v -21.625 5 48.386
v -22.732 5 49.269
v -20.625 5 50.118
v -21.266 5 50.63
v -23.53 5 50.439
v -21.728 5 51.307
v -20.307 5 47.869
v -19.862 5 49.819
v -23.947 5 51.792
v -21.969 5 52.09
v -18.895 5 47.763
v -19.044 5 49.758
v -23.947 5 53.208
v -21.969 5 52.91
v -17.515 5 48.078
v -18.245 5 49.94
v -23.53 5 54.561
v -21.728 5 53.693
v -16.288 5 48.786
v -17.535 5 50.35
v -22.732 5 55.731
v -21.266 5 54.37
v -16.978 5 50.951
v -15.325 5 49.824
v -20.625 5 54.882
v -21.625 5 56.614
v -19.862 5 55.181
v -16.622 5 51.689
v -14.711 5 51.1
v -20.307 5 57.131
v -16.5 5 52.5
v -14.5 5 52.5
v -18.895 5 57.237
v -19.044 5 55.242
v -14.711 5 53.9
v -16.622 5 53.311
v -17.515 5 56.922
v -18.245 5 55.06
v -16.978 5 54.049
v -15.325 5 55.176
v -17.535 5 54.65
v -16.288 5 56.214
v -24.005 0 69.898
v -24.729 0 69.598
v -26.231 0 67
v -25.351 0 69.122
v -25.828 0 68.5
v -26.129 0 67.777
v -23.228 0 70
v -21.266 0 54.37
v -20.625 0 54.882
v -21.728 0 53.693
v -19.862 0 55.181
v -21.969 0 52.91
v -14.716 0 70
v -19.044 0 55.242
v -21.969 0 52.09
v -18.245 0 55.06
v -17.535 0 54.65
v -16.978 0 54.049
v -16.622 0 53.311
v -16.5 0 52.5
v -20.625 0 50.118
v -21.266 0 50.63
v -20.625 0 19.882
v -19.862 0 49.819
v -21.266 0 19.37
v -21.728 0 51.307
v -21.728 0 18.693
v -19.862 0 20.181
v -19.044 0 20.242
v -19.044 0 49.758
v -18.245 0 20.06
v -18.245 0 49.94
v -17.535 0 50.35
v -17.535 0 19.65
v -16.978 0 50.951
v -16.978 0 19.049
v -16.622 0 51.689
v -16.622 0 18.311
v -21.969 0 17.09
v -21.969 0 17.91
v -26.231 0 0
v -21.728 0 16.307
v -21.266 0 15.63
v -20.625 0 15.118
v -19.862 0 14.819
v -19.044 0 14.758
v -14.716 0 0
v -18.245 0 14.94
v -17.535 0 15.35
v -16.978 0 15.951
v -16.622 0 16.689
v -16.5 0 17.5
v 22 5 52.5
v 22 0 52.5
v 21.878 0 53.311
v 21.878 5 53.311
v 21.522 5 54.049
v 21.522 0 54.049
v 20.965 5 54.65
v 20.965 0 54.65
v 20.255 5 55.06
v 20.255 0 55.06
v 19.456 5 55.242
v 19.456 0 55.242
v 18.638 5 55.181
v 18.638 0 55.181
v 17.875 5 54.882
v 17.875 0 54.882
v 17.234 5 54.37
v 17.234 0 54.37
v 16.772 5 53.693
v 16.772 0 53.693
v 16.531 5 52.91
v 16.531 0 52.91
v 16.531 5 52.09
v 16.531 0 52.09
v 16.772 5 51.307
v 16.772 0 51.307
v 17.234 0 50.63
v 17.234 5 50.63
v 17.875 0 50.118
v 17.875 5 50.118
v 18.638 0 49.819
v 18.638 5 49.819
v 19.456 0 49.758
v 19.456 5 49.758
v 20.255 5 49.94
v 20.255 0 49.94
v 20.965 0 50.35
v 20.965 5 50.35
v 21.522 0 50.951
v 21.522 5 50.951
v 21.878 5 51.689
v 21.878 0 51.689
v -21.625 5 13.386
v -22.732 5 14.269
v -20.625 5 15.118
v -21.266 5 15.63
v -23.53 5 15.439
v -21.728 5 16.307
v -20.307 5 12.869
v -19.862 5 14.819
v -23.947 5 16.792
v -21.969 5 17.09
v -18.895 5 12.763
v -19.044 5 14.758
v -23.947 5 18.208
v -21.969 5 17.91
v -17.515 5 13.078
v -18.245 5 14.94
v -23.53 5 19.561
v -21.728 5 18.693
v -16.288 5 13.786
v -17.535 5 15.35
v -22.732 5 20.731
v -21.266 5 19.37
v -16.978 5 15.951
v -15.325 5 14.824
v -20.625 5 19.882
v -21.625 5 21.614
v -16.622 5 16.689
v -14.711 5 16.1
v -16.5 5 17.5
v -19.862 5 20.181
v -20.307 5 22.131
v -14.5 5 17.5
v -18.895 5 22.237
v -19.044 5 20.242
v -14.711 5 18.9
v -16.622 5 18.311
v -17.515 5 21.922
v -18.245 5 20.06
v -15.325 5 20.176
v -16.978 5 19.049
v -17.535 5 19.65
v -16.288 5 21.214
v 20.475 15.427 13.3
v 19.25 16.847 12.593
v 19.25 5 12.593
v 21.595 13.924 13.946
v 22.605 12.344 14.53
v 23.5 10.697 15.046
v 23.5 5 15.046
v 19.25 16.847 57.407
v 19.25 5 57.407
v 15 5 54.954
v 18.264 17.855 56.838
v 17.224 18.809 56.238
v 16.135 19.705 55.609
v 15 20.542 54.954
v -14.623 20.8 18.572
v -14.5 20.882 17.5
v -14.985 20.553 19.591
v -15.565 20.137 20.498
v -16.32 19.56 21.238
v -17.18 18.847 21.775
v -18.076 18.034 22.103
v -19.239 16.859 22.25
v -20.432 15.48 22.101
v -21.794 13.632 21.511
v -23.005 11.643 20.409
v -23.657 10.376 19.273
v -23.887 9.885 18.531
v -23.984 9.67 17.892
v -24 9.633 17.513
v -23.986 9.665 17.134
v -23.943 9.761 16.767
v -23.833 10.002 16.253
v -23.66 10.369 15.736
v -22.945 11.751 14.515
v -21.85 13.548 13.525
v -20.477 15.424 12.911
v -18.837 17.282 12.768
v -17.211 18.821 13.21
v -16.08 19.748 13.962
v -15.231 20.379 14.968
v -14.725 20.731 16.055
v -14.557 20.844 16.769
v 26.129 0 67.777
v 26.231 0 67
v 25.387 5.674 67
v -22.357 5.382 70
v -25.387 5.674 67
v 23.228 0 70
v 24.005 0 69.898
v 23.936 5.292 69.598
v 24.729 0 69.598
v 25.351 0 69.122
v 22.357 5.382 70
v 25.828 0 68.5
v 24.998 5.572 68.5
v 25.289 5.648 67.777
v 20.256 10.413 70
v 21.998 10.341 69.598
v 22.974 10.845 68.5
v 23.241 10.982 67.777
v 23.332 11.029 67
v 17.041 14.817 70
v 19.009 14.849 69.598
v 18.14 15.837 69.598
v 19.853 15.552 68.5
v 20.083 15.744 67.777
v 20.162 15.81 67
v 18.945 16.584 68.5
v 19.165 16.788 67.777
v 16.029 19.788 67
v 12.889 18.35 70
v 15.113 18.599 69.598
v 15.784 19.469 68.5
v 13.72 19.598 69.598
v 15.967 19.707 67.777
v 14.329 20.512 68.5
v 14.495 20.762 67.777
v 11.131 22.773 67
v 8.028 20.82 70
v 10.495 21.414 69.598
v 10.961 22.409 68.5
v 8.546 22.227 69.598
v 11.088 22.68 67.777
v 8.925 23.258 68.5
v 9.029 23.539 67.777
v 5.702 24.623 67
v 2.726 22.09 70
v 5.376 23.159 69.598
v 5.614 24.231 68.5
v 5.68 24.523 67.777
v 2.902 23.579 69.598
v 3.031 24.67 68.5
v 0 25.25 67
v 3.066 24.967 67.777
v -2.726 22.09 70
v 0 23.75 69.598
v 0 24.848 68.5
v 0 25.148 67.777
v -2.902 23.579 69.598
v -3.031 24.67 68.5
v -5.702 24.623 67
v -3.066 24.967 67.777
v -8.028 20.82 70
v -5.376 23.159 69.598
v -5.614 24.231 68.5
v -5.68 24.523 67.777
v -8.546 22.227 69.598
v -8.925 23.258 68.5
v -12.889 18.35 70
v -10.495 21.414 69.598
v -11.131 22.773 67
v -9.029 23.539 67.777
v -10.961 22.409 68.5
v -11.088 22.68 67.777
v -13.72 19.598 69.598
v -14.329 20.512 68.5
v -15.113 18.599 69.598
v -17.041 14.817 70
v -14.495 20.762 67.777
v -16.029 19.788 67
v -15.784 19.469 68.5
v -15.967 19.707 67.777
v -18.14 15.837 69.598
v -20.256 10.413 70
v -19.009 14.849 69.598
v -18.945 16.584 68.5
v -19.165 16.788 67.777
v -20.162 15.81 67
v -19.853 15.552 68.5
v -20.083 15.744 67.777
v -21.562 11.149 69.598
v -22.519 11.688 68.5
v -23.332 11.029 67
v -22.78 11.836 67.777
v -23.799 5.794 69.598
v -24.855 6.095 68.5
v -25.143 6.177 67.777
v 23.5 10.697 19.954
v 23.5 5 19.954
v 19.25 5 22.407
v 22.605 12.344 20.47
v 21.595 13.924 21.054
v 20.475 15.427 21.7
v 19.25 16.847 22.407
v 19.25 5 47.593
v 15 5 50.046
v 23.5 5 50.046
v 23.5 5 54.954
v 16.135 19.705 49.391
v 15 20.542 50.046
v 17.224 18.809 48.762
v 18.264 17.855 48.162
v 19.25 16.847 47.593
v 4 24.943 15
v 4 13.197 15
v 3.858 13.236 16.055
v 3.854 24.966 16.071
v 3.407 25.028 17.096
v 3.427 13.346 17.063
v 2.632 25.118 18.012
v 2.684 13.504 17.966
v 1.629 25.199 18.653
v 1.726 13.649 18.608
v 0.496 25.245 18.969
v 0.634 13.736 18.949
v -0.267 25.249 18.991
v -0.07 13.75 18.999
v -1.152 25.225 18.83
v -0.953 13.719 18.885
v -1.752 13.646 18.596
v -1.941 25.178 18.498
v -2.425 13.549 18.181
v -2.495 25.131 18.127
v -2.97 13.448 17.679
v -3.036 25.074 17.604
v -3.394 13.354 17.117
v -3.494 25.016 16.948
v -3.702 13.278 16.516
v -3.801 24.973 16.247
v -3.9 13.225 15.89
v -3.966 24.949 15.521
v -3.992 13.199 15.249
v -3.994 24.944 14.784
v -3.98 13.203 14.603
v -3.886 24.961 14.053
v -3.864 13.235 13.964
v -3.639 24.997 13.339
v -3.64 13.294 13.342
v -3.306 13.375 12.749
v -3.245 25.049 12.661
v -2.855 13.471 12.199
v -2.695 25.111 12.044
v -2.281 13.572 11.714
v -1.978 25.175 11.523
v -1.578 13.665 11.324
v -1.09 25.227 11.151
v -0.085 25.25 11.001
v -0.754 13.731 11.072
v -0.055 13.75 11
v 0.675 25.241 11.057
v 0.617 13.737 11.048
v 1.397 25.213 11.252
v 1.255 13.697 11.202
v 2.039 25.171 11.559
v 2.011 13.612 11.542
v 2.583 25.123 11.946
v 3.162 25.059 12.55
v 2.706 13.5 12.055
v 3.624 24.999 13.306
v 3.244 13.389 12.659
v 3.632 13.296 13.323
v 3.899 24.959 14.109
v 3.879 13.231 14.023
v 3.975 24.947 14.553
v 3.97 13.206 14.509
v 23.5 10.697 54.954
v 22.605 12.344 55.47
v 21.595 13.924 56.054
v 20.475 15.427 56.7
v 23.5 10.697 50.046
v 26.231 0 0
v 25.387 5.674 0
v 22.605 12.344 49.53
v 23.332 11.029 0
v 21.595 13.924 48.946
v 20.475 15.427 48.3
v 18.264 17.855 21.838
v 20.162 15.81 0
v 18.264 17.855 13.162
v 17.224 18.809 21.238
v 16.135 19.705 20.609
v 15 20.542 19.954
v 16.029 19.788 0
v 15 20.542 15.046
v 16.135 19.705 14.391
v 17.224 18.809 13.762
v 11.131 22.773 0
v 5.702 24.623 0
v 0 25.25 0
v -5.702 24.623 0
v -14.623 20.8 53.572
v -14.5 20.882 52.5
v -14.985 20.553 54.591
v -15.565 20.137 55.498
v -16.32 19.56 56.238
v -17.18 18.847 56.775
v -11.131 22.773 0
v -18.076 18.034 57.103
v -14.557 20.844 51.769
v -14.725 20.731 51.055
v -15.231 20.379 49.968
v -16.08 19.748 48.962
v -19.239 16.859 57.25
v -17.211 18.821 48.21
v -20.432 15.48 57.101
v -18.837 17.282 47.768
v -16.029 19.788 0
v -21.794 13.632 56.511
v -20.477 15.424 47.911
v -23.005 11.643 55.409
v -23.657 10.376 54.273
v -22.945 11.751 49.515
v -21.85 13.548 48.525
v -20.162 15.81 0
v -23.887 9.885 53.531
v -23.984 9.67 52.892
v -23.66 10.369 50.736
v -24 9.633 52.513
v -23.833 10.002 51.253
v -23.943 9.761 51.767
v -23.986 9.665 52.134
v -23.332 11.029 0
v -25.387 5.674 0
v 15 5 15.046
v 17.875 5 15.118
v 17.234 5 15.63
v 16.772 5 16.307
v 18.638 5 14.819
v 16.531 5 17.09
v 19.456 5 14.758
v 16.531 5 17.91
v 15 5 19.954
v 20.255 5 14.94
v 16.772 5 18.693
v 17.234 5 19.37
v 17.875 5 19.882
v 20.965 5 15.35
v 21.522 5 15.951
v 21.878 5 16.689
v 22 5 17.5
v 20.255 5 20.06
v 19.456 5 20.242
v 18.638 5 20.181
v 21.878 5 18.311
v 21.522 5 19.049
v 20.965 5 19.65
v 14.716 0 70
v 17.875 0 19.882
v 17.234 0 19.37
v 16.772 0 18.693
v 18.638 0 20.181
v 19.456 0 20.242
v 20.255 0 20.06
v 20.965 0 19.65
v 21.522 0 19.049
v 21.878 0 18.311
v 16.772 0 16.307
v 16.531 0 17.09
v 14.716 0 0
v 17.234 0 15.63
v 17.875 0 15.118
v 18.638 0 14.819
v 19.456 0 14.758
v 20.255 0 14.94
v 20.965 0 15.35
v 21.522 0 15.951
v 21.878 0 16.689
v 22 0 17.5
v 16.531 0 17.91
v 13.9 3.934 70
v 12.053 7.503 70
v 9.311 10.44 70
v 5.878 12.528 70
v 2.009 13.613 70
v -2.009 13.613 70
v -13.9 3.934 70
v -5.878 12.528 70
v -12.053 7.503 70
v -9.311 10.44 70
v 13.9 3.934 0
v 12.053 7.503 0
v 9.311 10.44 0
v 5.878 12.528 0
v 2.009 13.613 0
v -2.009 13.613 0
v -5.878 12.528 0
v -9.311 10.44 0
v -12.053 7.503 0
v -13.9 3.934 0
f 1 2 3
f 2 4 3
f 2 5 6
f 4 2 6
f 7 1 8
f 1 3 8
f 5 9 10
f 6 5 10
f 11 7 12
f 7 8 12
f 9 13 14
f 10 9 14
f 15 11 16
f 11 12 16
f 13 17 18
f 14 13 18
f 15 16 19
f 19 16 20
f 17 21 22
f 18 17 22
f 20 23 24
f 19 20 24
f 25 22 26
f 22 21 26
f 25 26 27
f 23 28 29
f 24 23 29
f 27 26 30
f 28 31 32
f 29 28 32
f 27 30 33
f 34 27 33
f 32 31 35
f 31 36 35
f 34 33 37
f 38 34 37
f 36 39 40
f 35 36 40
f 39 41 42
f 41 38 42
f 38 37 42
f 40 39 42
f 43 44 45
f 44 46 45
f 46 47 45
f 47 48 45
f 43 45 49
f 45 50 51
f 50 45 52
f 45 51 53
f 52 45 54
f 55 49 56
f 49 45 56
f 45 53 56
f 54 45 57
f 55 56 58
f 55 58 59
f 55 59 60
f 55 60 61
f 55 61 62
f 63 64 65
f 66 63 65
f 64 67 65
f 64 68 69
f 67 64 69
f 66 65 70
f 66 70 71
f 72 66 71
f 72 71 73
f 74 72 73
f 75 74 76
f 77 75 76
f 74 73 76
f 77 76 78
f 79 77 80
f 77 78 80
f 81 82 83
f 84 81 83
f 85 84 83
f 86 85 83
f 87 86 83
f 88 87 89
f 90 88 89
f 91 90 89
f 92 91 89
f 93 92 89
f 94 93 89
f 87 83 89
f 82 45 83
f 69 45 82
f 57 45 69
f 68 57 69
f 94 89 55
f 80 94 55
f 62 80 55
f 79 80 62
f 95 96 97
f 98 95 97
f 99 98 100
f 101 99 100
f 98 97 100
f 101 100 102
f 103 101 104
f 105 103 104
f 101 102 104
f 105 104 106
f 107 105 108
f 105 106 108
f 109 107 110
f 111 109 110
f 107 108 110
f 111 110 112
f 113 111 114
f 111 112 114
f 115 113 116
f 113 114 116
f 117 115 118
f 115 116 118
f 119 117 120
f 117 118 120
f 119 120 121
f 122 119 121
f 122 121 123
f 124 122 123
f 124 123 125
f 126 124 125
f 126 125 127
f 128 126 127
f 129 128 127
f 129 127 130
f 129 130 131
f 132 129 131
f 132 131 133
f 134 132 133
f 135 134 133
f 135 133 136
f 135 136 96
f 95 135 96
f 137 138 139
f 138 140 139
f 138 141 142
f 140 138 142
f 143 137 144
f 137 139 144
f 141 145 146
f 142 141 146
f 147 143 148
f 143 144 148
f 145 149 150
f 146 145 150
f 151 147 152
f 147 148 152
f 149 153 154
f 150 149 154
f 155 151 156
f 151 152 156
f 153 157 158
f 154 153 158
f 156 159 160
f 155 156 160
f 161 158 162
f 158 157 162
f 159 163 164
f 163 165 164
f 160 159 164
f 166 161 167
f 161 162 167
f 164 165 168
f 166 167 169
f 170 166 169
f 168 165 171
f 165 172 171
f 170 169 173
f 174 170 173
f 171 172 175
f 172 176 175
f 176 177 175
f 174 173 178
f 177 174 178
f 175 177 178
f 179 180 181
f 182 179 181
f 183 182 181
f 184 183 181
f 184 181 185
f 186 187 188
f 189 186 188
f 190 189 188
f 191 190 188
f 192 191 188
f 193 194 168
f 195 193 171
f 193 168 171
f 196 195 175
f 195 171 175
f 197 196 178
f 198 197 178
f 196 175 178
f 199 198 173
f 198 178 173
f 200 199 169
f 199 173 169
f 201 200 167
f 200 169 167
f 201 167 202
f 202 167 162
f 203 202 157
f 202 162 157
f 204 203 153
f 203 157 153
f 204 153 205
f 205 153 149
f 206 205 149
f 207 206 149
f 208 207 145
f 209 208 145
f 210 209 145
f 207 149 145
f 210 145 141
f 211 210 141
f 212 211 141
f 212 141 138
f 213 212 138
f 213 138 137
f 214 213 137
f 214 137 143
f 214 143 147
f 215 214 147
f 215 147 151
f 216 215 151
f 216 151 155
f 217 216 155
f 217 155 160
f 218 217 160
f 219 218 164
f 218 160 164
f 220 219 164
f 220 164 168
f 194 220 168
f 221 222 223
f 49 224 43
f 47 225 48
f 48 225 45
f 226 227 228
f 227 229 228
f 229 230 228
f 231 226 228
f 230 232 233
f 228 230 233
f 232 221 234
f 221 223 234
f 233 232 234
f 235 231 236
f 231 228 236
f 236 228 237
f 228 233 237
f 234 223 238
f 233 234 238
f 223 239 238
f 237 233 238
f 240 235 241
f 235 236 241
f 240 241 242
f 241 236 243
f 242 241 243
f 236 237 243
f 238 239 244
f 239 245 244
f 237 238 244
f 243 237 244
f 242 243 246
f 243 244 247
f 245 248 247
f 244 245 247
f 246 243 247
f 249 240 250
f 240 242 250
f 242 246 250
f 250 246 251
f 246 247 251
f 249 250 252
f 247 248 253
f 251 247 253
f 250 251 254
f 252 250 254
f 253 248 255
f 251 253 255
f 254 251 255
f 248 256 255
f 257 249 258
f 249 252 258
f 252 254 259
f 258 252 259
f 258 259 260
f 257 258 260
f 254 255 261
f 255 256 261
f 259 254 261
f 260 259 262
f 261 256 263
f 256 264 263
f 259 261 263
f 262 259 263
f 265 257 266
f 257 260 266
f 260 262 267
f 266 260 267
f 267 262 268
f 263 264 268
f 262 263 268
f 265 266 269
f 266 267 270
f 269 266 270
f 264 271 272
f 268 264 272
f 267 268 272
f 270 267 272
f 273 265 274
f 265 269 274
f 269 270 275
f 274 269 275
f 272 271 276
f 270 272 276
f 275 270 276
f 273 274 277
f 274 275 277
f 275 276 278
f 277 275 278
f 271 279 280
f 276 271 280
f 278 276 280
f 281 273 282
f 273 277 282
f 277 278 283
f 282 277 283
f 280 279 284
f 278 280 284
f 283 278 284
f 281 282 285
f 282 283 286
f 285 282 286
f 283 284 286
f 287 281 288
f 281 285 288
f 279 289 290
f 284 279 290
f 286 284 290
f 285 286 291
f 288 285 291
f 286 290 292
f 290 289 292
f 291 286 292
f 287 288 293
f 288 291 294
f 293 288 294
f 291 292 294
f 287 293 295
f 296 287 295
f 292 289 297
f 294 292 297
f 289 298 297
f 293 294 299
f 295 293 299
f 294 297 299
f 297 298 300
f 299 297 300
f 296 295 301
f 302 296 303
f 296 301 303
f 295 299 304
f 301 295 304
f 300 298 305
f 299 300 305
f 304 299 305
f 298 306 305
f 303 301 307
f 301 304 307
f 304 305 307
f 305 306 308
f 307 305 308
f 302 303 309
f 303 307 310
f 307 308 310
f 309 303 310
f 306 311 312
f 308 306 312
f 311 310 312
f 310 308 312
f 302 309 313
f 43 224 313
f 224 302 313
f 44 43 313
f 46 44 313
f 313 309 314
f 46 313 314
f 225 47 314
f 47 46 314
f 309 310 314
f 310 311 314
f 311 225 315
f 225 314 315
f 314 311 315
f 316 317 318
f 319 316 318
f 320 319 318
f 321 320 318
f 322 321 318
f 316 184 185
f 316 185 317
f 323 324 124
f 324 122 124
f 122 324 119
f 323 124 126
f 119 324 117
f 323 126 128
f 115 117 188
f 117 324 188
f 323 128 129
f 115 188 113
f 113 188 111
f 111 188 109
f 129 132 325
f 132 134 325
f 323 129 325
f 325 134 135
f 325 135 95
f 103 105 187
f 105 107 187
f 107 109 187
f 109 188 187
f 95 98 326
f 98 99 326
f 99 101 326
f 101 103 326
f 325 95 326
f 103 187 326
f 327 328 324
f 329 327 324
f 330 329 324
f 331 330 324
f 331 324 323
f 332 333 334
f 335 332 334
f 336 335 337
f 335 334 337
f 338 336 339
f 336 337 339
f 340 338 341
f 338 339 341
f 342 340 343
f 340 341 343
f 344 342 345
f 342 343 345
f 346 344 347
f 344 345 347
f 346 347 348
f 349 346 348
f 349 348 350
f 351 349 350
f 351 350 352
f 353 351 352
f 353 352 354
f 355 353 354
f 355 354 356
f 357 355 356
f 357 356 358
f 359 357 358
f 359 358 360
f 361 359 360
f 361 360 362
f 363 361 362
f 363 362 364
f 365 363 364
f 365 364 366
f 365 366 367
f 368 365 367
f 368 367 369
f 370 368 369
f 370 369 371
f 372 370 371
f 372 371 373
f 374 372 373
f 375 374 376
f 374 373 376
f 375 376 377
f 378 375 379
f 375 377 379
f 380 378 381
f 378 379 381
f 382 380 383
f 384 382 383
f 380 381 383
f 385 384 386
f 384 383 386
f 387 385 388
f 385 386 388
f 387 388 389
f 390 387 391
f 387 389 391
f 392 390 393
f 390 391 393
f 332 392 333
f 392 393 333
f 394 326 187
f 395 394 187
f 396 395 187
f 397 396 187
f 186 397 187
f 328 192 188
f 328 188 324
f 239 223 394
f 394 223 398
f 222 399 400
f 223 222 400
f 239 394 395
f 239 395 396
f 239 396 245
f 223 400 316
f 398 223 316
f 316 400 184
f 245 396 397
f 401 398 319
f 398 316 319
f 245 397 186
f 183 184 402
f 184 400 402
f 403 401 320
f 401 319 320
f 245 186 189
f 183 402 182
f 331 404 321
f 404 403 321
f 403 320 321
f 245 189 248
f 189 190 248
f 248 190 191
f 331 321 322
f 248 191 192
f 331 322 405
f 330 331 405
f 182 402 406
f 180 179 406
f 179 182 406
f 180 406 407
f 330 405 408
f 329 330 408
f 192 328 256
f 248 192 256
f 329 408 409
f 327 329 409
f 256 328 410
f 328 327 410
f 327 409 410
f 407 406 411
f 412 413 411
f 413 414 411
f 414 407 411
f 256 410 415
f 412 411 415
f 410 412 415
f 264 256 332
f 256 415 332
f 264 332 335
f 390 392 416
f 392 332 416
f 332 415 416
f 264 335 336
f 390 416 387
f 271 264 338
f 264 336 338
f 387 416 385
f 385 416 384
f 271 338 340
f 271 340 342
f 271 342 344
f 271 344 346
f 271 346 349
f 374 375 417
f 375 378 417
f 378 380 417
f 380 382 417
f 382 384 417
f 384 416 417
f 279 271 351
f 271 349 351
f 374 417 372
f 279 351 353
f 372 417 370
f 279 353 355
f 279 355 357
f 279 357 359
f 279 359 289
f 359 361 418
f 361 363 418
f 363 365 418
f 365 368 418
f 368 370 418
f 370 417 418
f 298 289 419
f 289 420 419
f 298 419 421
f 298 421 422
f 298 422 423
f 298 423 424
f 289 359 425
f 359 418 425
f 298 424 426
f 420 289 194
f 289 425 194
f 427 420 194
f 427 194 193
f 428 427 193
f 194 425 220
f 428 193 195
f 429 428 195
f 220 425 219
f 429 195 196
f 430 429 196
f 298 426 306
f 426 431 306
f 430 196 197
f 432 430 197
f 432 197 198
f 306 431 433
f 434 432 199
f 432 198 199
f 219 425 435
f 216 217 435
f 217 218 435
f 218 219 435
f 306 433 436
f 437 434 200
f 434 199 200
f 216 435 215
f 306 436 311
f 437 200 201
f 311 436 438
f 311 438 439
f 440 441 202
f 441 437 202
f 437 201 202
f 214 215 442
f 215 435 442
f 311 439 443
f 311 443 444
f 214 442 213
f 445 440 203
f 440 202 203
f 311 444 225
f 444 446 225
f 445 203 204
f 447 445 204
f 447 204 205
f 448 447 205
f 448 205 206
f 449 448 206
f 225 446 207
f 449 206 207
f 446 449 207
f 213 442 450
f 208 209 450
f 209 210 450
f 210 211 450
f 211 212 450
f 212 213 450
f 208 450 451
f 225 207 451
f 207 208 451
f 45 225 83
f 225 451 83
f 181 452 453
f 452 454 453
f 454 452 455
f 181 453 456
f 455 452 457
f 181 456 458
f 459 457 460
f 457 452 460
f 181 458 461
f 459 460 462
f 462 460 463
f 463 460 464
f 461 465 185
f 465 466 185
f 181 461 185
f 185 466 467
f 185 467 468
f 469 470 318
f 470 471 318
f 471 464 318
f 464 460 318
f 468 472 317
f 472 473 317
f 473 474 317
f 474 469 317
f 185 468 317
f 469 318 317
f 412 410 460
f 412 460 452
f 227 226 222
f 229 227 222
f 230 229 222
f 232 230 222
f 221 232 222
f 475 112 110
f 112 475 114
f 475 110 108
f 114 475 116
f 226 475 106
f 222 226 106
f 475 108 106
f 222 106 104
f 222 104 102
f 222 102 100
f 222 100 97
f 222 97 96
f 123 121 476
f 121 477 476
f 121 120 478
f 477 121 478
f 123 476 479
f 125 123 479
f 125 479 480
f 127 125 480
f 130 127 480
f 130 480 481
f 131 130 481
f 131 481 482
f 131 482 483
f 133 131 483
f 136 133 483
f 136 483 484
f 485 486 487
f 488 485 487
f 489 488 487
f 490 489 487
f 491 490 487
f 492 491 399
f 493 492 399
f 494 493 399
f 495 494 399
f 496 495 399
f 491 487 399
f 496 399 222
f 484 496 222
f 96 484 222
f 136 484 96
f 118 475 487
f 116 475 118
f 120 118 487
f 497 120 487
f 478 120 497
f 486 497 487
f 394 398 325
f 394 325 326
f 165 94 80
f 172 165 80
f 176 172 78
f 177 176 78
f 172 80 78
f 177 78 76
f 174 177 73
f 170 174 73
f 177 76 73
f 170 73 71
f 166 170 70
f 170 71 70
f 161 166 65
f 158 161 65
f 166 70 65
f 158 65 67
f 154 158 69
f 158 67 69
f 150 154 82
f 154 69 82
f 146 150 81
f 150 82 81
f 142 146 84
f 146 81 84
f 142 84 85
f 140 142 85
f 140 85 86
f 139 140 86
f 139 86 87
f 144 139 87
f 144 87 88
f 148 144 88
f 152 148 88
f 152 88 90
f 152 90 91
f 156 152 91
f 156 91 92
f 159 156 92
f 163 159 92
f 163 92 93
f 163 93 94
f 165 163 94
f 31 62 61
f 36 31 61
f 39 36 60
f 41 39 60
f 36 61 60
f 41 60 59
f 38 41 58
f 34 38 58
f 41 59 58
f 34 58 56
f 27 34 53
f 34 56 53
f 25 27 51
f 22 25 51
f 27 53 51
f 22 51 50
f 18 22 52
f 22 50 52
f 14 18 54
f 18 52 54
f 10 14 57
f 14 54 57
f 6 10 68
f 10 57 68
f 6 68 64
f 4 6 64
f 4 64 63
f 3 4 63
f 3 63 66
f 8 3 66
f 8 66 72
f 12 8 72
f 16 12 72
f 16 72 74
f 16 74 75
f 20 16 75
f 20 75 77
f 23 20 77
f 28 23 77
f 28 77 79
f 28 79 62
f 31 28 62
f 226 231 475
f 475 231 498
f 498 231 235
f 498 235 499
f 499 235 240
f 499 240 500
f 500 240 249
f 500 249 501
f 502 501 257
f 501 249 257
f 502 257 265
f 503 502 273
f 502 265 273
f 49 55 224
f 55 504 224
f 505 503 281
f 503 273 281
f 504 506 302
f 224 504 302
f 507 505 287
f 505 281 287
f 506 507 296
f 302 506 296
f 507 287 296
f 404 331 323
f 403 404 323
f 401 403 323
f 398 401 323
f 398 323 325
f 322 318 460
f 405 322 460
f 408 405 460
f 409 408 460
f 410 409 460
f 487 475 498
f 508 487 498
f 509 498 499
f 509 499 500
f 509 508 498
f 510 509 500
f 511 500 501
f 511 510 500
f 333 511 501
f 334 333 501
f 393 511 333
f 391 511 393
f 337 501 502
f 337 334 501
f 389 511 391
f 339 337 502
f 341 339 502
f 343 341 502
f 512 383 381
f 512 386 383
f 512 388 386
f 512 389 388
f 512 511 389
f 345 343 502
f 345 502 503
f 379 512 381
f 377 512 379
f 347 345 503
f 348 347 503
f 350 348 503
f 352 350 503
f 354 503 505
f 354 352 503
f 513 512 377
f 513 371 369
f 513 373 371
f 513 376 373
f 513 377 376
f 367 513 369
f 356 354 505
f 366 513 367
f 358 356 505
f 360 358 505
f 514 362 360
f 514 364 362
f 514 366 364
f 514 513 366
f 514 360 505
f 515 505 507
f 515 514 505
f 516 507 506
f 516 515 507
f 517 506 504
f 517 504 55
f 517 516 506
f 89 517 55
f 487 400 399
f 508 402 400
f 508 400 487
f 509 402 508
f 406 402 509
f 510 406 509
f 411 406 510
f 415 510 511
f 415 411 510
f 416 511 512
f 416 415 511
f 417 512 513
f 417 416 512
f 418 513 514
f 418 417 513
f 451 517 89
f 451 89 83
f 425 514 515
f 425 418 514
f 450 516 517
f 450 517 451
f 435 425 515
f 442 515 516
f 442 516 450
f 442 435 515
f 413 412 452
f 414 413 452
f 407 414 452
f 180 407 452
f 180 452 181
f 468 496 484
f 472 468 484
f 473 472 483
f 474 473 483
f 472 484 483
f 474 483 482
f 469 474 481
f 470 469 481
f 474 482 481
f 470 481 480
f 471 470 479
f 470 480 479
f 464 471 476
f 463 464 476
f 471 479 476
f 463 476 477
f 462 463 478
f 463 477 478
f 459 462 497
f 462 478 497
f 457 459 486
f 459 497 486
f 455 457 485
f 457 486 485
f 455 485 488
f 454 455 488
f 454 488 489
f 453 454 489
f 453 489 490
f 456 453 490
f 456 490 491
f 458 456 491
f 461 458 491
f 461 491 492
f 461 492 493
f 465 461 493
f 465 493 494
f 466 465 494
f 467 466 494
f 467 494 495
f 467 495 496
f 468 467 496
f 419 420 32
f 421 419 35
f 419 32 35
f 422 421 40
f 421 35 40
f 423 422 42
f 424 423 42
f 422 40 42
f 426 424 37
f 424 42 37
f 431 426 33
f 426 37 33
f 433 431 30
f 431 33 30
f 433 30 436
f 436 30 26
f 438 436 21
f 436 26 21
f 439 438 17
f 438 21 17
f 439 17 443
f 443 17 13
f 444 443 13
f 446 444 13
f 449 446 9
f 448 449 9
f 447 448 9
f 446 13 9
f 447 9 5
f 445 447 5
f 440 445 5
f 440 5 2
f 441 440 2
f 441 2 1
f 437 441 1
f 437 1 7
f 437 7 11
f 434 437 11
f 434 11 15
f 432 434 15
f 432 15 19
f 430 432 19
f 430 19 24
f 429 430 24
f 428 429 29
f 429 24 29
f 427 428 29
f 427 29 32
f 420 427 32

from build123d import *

# Parameters (mm, degrees)
PAD_DEPTH       = 70
SKETCH001_R     = 2.75
SKETCH001_R_2   = 4
POCKET_DEPTH    = 25.251
SKETCH002_R     = 4.75
POCKET001_DEPTH = 20.251
FILLET_R        = 3


with BuildPart() as part:
    # Sketch → Pad (new body)
    with BuildSketch(Plane.XY):
        with BuildLine():
            ThreePointArc((14.716063, 0), (0, 13.75), (-14.716063, 0))
            Line((-26.230945, 0), (-14.716063, 0))
            ThreePointArc((26.230945, 0), (0, 25.25), (-26.230945, 0))
            Line((14.716063, 0), (26.230945, 0))
        make_face()
    extrude(amount=PAD_DEPTH)

    # Sketch001 (on Face2 of Pad) → Pocket (cut, through all)
    with BuildSketch(Plane.XZ):
        with Locations((-19.25, 17.5)):
            Circle(SKETCH001_R)
        with Locations((19.25, 17.5)):
            Circle(SKETCH001_R)
        with Locations((0, 15)):
            Circle(SKETCH001_R_2)
        with Locations((19.25, 52.5)):
            Circle(SKETCH001_R)
        with Locations((-19.25, 52.5)):
            Circle(SKETCH001_R)
    extrude(amount=-POCKET_DEPTH, mode=Mode.SUBTRACT)

    # Sketch002 (on DatumPlane) → Pocket001 (cut, through all)
    with BuildSketch(Plane.XZ.offset(-5)):
        with Locations((-19.25, 17.5)):
            Circle(SKETCH002_R)
        with Locations((-19.25, 52.5)):
            Circle(SKETCH002_R)
        Polygon((19.25, 12.592523), (23.5, 15.046261), (23.5, 19.953739), (19.25, 22.407477), (15, 19.953739), (15, 15.046261), align=None)
        Polygon((19.25, 47.592523), (23.5, 50.046261), (23.5, 54.953739), (19.25, 57.407477), (15, 54.953739), (15, 50.046261), align=None)
    extrude(amount=-POCKET001_DEPTH, mode=Mode.SUBTRACT)

    # Fillet
    fillet_edges = [part.edges().sort_by_distance(p)[0] for p in [
        (0, 25.25, 70),
    ]]
    fillet(fillet_edges, radius=FILLET_R)


solid = part.part
